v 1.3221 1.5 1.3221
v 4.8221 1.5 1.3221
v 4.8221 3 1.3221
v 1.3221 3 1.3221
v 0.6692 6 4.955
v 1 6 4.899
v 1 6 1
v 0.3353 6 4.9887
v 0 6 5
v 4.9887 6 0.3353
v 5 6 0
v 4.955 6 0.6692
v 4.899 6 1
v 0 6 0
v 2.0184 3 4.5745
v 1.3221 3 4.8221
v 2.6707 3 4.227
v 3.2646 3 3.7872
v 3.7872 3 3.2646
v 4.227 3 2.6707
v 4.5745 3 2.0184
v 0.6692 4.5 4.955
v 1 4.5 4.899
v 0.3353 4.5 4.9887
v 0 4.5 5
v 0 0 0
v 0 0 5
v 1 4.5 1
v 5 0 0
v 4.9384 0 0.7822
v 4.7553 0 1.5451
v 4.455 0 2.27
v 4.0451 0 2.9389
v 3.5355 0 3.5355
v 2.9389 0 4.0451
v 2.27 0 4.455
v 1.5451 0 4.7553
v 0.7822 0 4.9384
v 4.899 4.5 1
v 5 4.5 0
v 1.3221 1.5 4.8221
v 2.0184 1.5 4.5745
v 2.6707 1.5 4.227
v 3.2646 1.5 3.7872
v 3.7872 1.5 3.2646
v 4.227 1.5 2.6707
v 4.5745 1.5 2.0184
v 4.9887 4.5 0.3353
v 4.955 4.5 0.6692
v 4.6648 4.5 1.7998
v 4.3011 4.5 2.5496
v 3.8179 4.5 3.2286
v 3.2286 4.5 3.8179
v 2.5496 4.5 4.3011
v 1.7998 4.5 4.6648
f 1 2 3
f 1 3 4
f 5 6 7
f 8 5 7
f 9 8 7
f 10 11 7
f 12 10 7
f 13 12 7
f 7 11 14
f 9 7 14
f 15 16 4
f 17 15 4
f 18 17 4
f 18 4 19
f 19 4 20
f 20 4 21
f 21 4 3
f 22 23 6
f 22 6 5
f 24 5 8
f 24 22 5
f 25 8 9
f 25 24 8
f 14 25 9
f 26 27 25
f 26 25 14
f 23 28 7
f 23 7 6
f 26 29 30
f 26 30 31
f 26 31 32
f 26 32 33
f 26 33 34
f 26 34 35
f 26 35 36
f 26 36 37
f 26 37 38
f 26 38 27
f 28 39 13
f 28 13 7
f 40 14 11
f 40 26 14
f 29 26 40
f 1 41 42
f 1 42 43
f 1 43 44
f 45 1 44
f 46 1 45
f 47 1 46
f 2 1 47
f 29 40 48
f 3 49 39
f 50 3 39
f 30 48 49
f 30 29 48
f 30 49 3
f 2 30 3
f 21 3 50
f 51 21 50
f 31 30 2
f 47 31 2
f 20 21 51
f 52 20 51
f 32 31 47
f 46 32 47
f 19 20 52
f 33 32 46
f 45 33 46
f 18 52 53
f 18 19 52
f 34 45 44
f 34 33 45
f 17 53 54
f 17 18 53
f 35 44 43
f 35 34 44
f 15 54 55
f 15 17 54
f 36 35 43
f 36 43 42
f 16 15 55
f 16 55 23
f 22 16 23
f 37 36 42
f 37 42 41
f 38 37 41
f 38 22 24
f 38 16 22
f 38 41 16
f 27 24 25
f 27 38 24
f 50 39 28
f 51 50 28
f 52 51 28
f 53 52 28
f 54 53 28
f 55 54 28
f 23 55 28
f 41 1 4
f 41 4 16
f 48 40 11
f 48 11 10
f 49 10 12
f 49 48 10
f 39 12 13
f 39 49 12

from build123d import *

# Parameters (mm, degrees)
BOSS_EXTRUDE1_DEPTH = 4.5
CUT_EXTRUDE1_START  = -3
CUT_EXTRUDE1_DEPTH  = 1.5
BOSS_EXTRUDE2_DEPTH = 1.5


with BuildPart() as part:
    # Sketch1 → Boss-Extrude1 (new body)
    with BuildSketch(Plane(origin=(0, 0, 0), x_dir=(1, 0, 0), z_dir=(0, 1, 0))):
        with BuildLine():
            Line((0, 0), (5, 0))
            ThreePointArc((5, 0), (3.535533906, -3.535533906), (0, -5))
            Line((0, -5), (0, 0))
        make_face()
    extrude(amount=BOSS_EXTRUDE1_DEPTH)

    # Sketch2 → Cut-Extrude1 (cut)
    with BuildSketch(Plane(origin=(0, 4.5, 0), x_dir=(1, 0, 0), z_dir=(0, 1, 0)).offset(CUT_EXTRUDE1_START)):
        with BuildLine():
            Line((4.822051432, -1.322051432), (1.322051432, -1.322051432))
            Line((1.322051432, -1.322051432), (1.322051432, -4.822051432))
            ThreePointArc((1.322051432, -4.822051432), (3.535533906, -3.535533906), (4.822051432, -1.322051432))
        make_face()
    extrude(amount=CUT_EXTRUDE1_DEPTH, mode=Mode.SUBTRACT)

    # Sketch3 → Boss-Extrude2 (add)
    with BuildSketch(Plane(origin=(0, 4.5, 0), x_dir=(1, 0, 0), z_dir=(0, 1, 0))):
        with BuildLine():
            Line((4.898979486, -1), (1, -1))
            Line((1, -1), (1, -4.898979486))
            ThreePointArc((1, -4.898979486), (0.50254481, -4.974680765), (0, -5))
            Line((0, -5), (0, 0))
            Line((0, 0), (5, 0))
            ThreePointArc((5, 0), (4.974680765, -0.50254481), (4.898979486, -1))
        make_face()
    extrude(amount=BOSS_EXTRUDE2_DEPTH)


solid = part.part
